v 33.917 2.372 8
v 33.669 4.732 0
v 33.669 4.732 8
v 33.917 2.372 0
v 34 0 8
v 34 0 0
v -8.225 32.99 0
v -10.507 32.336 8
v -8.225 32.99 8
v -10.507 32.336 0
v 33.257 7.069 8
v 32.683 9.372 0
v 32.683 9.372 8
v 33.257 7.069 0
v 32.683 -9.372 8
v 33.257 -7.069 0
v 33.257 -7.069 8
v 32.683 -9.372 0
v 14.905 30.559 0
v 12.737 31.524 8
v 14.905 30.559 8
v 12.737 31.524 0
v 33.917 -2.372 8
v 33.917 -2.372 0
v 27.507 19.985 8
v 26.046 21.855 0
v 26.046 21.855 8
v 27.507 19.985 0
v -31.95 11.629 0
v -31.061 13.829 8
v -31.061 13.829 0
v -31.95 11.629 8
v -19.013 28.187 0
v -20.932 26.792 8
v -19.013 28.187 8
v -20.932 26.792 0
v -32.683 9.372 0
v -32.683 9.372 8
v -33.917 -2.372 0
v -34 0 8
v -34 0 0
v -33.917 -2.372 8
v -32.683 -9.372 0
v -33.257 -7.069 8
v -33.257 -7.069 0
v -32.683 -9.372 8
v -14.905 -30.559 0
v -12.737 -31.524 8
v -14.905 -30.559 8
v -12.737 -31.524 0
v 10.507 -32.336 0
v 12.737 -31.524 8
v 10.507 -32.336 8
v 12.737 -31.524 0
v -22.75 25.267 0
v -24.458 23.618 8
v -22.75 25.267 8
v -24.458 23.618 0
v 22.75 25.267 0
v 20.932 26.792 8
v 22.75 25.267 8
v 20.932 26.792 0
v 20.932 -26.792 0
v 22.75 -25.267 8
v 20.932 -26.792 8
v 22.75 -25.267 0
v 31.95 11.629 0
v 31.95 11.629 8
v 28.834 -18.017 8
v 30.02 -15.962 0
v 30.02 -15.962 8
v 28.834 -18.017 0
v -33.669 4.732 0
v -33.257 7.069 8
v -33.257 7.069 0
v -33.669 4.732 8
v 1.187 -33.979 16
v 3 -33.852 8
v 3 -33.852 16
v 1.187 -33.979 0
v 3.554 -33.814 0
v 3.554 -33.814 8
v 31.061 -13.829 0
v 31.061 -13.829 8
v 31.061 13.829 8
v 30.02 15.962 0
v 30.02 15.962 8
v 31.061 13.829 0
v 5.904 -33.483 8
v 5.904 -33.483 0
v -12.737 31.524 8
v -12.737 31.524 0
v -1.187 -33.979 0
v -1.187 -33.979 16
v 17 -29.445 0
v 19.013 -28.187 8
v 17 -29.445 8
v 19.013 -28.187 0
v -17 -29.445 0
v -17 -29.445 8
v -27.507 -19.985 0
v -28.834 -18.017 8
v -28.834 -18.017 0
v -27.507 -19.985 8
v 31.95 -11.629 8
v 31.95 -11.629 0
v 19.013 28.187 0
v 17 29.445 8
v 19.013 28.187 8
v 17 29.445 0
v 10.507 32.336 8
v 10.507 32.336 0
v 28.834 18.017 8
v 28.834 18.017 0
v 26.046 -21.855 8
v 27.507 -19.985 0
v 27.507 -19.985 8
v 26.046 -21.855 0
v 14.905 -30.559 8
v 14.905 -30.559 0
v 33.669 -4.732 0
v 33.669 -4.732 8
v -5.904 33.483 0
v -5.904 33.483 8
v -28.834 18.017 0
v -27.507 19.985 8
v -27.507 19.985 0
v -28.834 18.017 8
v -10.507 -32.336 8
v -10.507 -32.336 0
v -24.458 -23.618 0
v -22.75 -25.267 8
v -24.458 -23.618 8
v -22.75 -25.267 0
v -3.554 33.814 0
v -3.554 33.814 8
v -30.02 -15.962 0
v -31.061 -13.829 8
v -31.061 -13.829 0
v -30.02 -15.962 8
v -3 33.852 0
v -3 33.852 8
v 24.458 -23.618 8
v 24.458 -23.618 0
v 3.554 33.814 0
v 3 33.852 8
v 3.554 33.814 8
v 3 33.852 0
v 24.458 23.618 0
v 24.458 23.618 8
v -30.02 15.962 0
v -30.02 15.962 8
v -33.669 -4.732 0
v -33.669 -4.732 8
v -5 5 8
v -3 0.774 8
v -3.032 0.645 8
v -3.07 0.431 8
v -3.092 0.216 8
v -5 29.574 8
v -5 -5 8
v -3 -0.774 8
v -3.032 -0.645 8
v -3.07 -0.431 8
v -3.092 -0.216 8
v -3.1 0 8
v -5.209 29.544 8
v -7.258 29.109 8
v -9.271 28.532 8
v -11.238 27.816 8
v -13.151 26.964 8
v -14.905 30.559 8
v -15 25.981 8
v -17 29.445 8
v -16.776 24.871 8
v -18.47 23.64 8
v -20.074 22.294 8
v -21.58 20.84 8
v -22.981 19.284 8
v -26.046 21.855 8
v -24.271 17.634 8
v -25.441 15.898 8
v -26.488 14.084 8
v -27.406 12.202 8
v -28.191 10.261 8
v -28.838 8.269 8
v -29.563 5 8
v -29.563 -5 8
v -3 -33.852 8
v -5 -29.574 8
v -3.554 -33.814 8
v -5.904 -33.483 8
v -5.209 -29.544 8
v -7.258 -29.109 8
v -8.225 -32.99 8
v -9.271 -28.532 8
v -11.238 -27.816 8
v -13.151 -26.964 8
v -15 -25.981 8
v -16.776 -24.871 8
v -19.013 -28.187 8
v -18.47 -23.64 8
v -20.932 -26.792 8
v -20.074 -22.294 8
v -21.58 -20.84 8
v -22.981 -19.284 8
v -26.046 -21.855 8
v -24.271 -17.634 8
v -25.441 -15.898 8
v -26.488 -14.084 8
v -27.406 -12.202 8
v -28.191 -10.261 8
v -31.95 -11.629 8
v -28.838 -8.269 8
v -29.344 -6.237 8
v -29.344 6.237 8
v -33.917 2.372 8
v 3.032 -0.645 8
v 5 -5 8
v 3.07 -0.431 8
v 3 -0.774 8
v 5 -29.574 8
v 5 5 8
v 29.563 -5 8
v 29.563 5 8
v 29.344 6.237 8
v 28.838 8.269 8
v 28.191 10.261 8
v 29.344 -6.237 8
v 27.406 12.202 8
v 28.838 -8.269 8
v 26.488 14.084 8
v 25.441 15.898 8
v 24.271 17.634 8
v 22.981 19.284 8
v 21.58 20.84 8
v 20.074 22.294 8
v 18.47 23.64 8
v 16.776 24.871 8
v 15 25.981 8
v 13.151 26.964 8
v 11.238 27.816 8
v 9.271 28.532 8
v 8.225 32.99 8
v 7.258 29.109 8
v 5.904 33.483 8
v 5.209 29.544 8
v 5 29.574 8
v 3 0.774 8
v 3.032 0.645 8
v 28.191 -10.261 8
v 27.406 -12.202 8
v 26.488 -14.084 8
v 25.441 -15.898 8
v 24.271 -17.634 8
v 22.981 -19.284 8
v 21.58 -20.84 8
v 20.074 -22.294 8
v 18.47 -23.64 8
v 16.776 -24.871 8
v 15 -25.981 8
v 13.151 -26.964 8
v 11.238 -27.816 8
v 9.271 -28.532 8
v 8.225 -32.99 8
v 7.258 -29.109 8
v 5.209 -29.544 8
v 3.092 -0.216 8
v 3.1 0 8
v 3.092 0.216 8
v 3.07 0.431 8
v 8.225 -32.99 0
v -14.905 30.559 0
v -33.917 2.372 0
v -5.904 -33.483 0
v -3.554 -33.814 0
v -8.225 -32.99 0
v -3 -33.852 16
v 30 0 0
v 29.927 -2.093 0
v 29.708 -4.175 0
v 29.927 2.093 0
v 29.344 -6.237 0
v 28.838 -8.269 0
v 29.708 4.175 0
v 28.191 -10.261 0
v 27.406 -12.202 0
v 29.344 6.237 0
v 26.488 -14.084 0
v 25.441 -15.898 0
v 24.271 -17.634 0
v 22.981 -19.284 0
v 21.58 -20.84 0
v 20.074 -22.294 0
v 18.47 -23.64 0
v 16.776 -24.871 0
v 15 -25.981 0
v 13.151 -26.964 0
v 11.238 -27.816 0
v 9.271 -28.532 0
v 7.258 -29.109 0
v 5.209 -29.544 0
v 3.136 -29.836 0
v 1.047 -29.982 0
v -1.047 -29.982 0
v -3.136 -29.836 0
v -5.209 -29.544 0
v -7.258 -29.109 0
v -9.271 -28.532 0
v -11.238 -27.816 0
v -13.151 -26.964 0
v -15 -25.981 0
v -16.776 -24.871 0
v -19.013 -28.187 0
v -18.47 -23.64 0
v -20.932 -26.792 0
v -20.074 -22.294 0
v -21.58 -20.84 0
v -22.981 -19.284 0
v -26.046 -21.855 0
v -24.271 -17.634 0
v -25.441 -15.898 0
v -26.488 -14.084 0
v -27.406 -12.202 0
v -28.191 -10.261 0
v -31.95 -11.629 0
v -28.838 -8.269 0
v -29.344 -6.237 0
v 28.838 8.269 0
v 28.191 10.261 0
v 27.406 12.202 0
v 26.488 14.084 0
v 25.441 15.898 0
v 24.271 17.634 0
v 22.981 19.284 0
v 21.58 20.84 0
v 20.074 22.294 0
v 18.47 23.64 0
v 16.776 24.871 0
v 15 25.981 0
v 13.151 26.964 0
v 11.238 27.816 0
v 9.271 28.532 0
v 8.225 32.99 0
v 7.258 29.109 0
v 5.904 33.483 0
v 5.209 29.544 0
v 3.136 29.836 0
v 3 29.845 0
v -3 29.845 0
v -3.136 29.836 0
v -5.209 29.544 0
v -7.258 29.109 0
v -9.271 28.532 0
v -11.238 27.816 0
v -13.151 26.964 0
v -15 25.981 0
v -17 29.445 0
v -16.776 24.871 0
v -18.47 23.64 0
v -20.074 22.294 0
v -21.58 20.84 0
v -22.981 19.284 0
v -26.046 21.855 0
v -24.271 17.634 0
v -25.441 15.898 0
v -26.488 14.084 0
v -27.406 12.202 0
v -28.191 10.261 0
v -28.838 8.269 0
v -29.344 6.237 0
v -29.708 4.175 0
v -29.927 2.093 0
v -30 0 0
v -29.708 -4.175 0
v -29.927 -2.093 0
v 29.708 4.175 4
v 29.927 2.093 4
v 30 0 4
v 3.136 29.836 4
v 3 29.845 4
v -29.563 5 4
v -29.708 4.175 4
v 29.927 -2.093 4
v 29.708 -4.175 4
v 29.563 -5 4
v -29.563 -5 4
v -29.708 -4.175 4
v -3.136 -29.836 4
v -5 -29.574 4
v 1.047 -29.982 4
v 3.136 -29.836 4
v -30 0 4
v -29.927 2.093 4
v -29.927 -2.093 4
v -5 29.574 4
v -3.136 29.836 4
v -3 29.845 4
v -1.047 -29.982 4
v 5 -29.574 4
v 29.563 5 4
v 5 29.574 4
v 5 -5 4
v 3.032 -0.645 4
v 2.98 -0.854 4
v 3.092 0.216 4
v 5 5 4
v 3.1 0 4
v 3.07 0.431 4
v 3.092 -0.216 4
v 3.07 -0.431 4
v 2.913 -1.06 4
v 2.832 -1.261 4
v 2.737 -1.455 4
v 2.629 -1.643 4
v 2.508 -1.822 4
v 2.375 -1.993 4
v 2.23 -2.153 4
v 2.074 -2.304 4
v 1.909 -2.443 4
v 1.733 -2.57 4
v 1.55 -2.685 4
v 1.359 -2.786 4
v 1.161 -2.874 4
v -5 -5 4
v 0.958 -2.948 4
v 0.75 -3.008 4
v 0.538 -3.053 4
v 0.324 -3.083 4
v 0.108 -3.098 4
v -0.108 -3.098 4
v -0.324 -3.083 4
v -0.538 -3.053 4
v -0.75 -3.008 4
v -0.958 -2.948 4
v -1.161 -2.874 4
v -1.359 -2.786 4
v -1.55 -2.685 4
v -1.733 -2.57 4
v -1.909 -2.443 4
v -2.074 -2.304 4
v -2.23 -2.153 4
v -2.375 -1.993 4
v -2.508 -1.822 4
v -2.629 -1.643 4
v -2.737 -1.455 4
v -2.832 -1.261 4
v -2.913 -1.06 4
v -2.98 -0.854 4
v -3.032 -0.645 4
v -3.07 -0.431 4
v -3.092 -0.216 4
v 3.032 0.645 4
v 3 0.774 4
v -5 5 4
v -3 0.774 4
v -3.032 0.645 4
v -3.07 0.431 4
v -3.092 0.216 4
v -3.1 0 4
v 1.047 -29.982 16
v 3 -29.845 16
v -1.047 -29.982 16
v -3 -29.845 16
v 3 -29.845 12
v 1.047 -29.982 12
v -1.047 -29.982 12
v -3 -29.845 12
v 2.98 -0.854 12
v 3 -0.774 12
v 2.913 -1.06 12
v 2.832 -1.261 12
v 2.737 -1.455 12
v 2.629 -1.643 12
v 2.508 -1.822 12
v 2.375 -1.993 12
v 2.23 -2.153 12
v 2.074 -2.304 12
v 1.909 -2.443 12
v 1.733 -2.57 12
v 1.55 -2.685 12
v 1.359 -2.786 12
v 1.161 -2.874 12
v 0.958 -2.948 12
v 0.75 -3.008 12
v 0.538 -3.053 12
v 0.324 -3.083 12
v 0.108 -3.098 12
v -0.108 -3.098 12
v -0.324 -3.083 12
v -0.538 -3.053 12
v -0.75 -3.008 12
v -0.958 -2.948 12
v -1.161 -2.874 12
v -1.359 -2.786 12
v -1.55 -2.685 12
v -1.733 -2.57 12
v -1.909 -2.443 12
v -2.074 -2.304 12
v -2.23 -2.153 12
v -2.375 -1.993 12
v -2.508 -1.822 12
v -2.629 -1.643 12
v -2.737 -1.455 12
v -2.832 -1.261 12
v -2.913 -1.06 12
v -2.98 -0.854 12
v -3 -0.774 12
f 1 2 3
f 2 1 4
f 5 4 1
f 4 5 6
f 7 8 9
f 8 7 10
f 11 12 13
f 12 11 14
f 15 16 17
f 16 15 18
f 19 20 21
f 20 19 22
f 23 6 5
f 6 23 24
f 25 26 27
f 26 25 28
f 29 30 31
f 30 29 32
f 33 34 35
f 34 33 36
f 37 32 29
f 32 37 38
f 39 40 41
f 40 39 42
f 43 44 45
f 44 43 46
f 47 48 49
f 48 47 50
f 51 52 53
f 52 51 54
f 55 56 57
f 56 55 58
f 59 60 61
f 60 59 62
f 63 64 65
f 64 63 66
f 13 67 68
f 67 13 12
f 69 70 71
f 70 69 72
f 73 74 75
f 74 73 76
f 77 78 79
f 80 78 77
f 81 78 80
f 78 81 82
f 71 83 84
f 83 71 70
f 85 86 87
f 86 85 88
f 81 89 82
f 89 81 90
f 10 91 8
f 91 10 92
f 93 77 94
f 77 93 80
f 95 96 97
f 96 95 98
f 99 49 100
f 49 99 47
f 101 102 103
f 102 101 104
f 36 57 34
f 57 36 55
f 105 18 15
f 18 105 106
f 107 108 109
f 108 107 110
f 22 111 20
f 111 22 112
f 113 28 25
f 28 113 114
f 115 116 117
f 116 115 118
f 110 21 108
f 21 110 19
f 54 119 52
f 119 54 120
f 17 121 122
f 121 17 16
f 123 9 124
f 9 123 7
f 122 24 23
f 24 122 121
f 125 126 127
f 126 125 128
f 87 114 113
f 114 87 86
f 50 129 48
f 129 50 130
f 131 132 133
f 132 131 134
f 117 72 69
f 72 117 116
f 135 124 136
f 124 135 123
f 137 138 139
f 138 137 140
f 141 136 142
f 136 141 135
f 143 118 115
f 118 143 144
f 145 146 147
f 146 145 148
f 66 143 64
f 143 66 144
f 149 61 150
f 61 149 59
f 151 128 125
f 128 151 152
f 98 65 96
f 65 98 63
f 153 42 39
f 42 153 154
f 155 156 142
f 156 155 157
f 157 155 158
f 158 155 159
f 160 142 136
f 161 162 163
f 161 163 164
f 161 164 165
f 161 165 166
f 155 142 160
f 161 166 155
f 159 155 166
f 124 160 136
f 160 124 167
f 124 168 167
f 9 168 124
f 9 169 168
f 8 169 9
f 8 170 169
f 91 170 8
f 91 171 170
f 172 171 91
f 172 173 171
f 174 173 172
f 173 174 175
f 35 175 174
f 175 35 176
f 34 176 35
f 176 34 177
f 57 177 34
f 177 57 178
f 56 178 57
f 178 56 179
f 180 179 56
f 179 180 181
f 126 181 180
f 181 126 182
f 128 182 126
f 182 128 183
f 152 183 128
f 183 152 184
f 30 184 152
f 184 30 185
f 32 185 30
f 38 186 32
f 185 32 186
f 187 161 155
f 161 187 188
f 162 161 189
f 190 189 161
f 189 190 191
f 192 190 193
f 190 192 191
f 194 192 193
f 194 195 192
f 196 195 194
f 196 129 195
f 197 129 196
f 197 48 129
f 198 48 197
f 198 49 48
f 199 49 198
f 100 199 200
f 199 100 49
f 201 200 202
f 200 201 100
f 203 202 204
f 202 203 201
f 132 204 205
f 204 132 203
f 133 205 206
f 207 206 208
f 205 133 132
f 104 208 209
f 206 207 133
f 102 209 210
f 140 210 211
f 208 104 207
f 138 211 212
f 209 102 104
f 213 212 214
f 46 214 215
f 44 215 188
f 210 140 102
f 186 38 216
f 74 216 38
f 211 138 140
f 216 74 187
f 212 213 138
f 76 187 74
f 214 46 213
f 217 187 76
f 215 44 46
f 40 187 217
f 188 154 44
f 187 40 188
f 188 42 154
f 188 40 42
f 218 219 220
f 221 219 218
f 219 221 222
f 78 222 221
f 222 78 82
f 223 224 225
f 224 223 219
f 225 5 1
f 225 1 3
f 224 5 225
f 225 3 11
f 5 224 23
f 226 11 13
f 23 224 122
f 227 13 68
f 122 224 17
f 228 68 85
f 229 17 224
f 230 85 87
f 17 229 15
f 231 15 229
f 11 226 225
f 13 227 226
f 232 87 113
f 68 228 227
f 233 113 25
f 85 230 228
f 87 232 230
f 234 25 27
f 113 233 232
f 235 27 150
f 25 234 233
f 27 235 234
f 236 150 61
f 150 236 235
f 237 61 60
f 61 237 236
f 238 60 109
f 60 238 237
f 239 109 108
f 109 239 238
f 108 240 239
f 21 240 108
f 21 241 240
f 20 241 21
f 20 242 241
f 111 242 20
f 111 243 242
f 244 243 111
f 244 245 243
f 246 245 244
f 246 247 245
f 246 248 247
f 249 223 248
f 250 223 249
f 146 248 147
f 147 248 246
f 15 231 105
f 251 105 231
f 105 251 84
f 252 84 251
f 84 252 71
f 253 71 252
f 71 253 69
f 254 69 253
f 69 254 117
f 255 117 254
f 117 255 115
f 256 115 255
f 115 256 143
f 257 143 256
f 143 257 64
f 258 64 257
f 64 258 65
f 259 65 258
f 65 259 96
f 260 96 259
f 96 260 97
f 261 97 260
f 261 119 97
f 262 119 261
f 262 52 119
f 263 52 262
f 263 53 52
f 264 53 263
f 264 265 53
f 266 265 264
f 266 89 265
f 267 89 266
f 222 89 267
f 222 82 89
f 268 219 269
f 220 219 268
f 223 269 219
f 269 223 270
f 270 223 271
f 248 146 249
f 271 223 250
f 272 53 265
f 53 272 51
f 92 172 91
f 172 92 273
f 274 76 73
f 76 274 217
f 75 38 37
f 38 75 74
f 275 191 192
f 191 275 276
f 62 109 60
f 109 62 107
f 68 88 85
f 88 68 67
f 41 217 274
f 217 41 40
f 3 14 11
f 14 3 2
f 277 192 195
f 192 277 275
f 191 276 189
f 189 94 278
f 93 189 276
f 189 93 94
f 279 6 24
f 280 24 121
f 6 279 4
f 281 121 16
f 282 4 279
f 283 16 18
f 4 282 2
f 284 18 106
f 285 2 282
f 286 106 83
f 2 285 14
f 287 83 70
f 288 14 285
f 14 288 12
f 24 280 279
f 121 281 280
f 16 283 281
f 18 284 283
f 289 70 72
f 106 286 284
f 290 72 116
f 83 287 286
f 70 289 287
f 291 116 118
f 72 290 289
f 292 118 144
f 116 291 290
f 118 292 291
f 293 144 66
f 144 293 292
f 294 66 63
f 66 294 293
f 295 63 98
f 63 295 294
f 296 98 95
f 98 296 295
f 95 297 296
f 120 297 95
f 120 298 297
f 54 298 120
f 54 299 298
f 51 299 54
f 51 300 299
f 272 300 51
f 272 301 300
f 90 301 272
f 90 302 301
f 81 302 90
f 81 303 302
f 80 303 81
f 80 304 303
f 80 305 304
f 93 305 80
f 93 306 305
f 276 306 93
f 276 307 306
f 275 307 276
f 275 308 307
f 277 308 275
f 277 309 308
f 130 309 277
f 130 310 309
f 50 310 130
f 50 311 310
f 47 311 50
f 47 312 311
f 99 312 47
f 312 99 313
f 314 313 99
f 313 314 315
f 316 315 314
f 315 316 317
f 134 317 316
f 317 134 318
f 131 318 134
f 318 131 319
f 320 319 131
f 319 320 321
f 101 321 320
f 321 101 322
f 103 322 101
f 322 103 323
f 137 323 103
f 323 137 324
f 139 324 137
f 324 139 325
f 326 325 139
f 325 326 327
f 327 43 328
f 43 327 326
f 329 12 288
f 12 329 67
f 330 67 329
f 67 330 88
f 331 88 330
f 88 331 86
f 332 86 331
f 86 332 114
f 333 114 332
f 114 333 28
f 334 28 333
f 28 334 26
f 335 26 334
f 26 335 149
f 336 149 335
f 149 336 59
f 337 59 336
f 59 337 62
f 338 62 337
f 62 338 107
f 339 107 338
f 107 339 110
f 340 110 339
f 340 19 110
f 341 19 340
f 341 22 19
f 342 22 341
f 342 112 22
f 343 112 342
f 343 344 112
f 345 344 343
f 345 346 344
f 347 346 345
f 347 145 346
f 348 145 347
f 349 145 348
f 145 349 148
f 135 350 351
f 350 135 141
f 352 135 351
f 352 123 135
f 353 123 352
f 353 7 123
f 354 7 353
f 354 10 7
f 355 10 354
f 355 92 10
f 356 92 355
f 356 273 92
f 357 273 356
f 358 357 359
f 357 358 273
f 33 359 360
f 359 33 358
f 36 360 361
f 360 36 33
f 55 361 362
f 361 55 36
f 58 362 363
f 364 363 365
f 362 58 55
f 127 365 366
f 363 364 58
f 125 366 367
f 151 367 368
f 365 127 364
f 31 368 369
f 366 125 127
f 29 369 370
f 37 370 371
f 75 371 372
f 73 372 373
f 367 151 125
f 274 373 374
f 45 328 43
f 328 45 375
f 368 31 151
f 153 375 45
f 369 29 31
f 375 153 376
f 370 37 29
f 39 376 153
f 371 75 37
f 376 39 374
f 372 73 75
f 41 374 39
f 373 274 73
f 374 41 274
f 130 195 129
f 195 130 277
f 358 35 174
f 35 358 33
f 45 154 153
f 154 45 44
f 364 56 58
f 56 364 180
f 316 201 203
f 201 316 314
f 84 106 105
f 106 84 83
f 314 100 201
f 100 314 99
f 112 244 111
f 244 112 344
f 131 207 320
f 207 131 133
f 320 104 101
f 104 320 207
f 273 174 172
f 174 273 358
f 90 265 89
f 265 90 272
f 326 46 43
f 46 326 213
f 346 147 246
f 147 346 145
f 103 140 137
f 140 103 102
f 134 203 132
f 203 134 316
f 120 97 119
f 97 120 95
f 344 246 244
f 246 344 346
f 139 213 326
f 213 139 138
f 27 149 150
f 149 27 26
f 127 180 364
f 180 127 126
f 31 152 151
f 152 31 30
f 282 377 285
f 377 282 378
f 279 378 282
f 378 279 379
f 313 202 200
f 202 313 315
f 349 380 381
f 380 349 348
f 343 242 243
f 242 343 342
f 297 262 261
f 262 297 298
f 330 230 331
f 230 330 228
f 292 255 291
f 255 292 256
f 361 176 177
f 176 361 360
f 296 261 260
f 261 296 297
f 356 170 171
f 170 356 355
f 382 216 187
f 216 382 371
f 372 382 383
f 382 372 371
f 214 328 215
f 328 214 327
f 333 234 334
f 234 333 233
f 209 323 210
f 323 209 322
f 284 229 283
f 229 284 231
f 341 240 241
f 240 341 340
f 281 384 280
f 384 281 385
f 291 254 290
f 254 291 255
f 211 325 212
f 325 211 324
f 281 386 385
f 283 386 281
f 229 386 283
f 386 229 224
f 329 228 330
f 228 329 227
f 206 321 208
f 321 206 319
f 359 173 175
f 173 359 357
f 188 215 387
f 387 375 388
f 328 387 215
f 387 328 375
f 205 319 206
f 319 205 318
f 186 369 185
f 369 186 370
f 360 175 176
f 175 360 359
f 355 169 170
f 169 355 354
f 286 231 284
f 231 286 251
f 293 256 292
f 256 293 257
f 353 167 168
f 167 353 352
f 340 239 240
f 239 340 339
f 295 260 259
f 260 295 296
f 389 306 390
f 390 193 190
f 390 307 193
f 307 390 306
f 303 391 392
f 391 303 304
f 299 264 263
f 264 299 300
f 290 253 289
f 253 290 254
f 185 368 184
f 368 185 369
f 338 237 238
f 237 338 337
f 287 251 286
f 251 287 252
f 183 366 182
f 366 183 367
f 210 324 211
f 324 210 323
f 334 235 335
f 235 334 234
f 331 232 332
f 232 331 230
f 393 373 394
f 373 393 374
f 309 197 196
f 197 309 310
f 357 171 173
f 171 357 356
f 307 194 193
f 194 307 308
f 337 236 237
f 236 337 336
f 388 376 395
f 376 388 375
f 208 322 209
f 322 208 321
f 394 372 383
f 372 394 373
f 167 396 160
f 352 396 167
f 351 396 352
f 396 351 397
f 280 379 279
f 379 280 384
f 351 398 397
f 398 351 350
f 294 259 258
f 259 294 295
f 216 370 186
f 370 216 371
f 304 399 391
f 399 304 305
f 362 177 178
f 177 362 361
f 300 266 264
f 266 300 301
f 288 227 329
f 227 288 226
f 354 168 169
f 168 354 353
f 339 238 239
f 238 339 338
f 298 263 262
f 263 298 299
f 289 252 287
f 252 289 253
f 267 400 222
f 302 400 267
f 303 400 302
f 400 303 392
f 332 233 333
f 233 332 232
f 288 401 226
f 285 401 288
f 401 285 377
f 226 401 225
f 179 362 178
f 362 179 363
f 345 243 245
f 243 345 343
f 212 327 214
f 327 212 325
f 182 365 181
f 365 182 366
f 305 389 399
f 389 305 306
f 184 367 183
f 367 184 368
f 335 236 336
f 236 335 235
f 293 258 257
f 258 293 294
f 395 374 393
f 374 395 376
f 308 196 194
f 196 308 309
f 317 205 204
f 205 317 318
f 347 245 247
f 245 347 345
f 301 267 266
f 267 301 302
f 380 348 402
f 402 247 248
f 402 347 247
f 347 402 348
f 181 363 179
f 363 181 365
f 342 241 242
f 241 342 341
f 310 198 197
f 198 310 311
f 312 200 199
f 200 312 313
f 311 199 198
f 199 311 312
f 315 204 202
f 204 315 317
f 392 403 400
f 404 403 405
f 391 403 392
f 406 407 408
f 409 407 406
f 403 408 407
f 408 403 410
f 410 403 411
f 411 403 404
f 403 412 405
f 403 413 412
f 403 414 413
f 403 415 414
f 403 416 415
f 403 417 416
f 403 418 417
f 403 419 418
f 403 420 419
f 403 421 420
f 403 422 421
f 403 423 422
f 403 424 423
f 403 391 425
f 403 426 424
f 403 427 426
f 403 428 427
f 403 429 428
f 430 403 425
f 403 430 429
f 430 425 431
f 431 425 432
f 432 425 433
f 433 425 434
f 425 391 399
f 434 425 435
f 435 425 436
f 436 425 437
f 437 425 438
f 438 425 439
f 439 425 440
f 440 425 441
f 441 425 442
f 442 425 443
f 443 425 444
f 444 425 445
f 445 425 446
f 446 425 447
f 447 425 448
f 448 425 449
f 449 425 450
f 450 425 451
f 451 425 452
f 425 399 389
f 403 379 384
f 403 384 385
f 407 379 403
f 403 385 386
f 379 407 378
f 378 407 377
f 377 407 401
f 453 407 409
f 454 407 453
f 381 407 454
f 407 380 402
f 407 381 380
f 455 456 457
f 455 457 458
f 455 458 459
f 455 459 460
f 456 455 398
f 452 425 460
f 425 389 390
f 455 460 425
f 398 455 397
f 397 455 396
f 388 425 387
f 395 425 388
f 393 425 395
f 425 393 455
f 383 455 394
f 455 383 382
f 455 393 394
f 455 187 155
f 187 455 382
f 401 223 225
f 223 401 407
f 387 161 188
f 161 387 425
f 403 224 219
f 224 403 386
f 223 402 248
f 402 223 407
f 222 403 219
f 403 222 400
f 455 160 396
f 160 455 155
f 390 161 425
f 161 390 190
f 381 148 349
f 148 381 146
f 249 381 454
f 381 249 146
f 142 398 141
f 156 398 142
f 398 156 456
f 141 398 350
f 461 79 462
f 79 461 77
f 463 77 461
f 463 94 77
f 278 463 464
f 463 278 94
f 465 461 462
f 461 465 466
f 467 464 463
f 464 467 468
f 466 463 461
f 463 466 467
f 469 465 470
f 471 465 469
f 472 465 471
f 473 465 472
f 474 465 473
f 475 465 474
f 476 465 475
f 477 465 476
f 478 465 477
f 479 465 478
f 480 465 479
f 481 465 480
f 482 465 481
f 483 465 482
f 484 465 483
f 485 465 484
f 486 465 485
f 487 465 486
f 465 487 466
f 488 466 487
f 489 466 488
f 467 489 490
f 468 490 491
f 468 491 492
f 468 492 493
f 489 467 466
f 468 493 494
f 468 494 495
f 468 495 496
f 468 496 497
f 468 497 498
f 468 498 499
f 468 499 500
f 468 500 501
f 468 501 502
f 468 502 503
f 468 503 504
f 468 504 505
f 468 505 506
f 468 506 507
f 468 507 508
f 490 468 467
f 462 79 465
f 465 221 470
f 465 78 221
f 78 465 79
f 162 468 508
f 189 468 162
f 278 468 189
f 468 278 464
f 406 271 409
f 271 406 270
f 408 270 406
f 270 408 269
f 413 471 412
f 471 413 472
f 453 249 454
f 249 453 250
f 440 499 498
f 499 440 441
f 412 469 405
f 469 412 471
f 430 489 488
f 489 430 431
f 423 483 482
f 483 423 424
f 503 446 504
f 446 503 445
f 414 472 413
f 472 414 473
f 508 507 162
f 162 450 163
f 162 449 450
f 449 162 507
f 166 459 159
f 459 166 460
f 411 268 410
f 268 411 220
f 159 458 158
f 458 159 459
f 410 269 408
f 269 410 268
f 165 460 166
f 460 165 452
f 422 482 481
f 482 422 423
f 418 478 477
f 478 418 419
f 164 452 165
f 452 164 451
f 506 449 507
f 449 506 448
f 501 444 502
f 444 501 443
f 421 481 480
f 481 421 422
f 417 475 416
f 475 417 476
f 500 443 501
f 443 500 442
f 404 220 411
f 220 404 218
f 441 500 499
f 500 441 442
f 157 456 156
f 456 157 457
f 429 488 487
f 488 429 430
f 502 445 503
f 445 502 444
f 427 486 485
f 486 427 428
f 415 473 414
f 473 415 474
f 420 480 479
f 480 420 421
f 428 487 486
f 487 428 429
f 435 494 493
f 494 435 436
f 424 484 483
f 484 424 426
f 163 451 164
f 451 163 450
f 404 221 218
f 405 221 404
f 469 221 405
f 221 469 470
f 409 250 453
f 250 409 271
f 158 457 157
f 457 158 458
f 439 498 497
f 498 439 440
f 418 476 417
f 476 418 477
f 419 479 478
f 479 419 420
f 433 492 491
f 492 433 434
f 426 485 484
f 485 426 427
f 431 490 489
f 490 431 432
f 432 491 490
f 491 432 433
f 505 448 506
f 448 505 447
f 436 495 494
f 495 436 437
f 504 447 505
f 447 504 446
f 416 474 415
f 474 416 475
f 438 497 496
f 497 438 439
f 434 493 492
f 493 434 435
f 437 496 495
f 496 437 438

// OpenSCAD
//rayon du cercle exterieur (30)
a=30;
//Epaisseur du cercle exterieur (4)
b=4;
//hauteur du cercle exterieur (8)
c=8;
//largeur des cubes internes (10)
d=10;
//hauteur des cubes internes (4)
e=4;
//largeur des cubes d'emboitement (6)
f=6;
//rayon du cercle interieur (3)
g=3;
difference(){
union(){
difference(){
union(){
difference(){
cylinder (r=a+b, h=c,$fn=90);
cylinder ( r=a, h=c,$fn=90);}
translate([-a,-d/2,c-e]) cube([a*2,d,e]);
translate([-d/2,-a,c-e]) cube([d,a*2,e]);}
union(){
    color("red") translate([-f/2,0,0]) cube([f,a+b+1,c]);
    color("red") cylinder (r=g, h=c,$fn=90);}
}
translate([0,0,c*2]) rotate([0,180,180]) intersection(){
union(){
difference(){
cylinder (r=a+b, h=c,$fn=90);
cylinder ( r=a, h=c,$fn=90);}
translate([-a,-d/2,c-e]) cube([a*2,d,e]);
translate([-d/2,-a,c-e]) cube([d,a*2,e]);}
union(){
    color("red") translate([-f/2,0,0]) cube([f,a+b+1,c]);
    color("red") cylinder (r=g, h=c,$fn=90);}
}}
color("blue") cylinder (r=g+0.1, h=c*2,$fn=90);}
